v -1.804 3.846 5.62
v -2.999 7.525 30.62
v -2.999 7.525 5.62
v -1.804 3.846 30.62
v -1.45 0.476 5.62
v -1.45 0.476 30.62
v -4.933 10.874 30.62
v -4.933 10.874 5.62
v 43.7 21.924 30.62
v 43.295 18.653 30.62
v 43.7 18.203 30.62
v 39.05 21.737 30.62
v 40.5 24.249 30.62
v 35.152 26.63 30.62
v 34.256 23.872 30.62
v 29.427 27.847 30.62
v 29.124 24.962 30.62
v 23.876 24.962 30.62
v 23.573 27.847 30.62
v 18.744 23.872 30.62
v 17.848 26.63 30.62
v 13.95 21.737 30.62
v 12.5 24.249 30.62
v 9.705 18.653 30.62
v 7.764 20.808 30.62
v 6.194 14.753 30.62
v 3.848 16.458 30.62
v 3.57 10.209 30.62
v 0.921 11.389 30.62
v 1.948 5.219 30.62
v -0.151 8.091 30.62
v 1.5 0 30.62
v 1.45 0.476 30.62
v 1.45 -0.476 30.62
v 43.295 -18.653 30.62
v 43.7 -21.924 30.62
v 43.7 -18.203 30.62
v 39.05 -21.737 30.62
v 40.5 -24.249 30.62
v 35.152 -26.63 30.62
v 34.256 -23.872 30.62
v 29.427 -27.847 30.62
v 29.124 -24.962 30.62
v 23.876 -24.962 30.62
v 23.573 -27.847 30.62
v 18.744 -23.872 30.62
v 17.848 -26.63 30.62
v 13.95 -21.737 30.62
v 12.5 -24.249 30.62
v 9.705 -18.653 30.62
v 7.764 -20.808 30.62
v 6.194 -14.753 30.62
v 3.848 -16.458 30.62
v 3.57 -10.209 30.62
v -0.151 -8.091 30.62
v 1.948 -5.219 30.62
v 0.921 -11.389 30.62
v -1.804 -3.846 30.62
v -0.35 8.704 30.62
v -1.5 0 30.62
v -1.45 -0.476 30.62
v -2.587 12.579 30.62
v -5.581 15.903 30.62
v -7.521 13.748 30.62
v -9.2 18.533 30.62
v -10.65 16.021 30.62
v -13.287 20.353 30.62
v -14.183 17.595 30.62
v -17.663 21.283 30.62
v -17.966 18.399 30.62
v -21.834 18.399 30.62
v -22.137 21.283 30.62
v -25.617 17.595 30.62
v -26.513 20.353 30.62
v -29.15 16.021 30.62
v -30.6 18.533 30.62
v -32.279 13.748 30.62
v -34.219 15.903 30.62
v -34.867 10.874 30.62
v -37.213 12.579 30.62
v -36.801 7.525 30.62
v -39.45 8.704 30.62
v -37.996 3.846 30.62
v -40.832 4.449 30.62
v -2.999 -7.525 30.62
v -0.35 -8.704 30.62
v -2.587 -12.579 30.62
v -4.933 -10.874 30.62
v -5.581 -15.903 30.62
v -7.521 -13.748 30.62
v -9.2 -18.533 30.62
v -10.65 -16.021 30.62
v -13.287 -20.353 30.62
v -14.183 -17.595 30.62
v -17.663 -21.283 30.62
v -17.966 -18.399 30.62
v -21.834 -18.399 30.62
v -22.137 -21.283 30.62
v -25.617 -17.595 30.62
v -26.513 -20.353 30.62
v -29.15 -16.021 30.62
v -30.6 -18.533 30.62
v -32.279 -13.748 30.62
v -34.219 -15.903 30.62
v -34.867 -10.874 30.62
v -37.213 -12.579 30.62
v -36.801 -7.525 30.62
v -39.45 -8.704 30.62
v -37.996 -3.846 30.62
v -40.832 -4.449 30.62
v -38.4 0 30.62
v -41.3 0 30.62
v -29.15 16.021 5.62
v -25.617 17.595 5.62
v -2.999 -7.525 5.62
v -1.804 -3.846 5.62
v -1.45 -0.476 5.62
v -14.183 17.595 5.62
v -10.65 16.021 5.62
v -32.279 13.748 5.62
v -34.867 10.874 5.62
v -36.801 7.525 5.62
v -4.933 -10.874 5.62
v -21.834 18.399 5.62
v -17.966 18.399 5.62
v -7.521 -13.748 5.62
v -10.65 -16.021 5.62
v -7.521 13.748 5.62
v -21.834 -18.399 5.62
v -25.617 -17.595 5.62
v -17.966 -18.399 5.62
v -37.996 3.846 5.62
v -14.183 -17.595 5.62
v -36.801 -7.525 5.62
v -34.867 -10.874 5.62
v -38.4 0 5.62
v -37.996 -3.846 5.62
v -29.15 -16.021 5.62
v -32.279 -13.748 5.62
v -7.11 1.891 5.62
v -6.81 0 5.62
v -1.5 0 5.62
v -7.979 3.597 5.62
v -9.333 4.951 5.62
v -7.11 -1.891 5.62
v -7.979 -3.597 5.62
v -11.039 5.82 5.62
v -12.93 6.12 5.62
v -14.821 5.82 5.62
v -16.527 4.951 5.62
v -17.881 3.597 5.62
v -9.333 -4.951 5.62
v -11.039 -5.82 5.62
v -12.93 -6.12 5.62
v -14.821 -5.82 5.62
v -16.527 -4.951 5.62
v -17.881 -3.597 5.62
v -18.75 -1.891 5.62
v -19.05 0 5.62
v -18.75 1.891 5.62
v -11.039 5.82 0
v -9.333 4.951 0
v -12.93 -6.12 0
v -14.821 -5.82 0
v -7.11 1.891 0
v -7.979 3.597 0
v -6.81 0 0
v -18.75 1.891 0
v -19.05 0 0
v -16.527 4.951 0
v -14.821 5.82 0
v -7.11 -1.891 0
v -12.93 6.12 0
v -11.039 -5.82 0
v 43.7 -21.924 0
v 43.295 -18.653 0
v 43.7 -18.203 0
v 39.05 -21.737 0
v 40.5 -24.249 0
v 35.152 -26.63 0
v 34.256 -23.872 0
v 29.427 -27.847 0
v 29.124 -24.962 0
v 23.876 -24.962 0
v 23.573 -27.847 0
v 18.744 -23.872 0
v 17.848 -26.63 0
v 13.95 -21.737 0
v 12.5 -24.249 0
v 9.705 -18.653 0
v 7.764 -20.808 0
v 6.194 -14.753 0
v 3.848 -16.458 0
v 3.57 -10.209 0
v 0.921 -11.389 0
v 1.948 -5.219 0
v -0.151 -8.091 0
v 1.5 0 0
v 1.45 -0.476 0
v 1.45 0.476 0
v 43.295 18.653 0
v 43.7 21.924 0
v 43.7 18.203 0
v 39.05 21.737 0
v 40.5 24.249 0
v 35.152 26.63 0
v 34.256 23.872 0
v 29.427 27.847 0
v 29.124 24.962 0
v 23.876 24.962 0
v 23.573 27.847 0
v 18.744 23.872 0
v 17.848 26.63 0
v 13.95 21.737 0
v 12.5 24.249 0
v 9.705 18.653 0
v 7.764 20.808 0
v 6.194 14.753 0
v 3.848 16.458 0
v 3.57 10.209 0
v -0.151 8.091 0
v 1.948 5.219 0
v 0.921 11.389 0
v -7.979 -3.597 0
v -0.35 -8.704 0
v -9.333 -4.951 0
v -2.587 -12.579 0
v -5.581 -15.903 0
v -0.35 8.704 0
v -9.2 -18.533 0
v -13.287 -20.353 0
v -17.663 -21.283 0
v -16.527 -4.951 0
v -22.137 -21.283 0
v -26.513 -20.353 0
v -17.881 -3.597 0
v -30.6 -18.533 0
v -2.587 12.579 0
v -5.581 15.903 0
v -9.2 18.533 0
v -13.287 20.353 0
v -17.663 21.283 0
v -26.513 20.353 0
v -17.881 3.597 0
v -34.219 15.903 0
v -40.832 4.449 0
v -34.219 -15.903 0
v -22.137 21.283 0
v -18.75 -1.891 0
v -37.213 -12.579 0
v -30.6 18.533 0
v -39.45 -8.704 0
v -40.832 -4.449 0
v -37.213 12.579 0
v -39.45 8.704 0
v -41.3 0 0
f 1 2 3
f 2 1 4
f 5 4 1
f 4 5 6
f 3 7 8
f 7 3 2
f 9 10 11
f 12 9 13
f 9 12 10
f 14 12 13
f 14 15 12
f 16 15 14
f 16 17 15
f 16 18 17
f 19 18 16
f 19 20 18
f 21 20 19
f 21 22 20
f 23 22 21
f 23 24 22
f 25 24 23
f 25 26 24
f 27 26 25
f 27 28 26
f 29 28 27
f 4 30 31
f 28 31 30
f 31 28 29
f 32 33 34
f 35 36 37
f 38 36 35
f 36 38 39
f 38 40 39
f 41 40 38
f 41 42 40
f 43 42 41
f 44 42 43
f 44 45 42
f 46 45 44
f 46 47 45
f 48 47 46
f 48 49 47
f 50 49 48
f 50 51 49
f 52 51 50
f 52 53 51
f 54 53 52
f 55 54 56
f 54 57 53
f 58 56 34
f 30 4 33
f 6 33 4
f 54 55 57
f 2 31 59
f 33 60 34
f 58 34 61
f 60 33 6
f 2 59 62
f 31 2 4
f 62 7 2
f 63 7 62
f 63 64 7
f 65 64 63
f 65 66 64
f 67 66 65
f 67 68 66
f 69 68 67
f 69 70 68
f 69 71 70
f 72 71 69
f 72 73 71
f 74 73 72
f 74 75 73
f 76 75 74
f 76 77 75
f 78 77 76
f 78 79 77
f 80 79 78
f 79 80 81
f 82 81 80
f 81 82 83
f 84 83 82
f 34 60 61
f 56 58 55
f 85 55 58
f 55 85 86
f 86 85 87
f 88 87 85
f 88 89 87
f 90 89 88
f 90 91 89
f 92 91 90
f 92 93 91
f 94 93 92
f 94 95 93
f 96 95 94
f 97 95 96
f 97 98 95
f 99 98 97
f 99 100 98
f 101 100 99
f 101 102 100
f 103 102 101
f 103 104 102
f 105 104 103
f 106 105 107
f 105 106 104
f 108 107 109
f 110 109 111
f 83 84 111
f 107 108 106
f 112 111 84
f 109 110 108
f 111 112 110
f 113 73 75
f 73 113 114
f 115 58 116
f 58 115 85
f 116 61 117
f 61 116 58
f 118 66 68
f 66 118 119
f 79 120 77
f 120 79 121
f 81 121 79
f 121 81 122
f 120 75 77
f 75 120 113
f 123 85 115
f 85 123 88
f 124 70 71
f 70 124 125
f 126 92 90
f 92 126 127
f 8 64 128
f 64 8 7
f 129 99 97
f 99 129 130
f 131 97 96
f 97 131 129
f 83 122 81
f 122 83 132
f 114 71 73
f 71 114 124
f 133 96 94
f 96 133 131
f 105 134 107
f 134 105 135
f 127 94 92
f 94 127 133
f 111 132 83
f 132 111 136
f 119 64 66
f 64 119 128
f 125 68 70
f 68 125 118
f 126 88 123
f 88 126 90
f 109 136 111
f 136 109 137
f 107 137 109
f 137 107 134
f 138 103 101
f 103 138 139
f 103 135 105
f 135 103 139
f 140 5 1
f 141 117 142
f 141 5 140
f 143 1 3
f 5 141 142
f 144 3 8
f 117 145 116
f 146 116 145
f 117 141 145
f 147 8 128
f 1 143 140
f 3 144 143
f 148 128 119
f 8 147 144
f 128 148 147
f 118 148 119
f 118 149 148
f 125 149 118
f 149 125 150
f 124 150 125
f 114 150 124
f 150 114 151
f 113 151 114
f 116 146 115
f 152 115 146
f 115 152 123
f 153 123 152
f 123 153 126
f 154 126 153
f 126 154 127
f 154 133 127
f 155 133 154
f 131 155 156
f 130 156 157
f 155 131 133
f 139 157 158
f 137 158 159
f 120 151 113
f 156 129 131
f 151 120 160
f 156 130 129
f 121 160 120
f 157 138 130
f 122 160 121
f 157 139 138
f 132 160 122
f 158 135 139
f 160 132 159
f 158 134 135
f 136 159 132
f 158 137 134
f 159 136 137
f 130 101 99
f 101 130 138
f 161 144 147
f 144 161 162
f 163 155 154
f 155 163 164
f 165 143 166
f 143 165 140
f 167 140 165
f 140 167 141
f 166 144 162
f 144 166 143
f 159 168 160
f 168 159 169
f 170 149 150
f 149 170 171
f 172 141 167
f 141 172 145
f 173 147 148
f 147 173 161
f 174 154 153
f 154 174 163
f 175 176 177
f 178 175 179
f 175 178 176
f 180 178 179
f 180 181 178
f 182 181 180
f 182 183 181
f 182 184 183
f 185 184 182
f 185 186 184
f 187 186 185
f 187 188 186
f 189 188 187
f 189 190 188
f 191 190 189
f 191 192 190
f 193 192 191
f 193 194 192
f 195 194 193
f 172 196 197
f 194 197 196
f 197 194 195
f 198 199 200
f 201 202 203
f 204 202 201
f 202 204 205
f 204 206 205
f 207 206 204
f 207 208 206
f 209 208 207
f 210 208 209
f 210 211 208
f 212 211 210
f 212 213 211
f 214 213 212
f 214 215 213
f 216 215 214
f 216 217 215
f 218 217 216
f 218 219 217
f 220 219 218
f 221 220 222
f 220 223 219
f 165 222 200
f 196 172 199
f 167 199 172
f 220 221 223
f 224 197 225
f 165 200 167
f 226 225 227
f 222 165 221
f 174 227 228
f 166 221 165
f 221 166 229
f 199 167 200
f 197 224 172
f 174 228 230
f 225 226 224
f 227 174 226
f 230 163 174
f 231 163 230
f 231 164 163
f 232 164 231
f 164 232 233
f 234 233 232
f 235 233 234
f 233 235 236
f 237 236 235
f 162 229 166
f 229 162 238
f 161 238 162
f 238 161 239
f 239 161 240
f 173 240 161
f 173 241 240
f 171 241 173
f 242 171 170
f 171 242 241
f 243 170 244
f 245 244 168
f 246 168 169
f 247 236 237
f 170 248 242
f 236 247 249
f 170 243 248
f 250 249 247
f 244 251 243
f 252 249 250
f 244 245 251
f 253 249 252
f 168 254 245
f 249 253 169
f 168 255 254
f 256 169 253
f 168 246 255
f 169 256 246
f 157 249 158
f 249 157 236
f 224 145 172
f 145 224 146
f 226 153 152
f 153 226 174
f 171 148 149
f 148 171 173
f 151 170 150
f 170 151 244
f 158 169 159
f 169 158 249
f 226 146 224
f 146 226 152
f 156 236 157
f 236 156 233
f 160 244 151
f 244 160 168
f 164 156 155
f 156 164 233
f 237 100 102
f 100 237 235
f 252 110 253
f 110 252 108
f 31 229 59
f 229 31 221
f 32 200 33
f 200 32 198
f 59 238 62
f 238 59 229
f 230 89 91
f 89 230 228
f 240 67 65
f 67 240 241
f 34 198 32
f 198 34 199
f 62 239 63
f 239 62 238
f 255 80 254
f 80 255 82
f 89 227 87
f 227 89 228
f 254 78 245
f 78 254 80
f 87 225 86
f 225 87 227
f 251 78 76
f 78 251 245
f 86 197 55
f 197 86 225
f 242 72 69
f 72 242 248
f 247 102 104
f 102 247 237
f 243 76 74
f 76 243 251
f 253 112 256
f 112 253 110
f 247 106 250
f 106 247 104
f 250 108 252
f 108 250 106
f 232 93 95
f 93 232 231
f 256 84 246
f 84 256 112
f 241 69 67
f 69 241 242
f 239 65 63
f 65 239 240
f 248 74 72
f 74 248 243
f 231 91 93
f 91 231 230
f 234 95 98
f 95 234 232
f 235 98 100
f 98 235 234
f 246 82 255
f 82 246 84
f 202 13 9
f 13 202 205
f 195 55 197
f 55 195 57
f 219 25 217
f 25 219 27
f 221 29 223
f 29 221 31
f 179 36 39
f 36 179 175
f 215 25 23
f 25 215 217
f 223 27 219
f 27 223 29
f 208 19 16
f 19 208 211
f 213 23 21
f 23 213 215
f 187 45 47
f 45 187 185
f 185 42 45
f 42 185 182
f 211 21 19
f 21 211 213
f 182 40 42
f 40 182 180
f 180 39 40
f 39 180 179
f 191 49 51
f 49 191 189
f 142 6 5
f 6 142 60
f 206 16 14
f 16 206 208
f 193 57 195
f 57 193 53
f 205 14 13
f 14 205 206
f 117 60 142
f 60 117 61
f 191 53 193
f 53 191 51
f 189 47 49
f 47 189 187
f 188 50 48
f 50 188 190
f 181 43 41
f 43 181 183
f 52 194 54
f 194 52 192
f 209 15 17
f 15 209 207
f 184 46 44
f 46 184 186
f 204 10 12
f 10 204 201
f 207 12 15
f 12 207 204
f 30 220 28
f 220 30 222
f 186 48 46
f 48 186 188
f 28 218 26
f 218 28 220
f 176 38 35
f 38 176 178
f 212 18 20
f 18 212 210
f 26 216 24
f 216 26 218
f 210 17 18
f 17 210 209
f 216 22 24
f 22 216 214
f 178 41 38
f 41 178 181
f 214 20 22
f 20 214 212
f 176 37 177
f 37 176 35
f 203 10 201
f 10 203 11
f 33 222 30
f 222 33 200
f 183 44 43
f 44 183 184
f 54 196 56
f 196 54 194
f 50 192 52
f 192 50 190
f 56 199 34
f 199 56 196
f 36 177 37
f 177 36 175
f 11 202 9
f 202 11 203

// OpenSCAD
// Sorry for mixing openscad and freecad in one project.
// I started this project partly to learn freecad, but when I found
// myself needing to design the motor mount I didn't have the mental
// energy to re-inveigl myself into freecad, so I fell back on
// comfortable old openscad.


gearbox_r = 36.8/2; // The OD of the gearbox housing of the motor/gearbox combo I'm using.
gearbox_z = 25; // The length of the gearbox housing.
gearbox_out_r = 12.04/2; // A bearing enclosure that protrudes from the end of the gearbox.
gearbox_out_z = 5.62; // The length of the bearing holder protrusion
gearbox_out_edge_offset = 19.35; // The measured distance between the edge of the gearbox and the edge of the protrusion
gearbox_out_centre_offset = gearbox_out_edge_offset - (gearbox_r - gearbox_out_r); // Calculate the offset from the centre of the protrusion.
pump_r = 50/2; // The OD of the pump main housing, from the freecad file.
pump_z = gearbox_z+gearbox_out_z; // Limit the length of the mount to the size of the gearbox on the motor.
pump_slice_offset = 17.2; // From the freecad file, determines where the pump attachment ring is chopped off.

wt = 3; // Wall thickness.
clearance = 0.1;

module gearbox() {
    translate([0,0,gearbox_out_z]) cylinder(r=gearbox_r+clearance, h = gearbox_z);
    translate([gearbox_out_centre_offset,0,0]) cylinder(r=gearbox_out_r+clearance, h = gearbox_out_z);
}

module gearbox_shell() {
    difference() {
        cylinder(r=gearbox_r+wt, h = gearbox_z+gearbox_out_z);
        gearbox();
    }
}

module pump() {
    cylinder(r=pump_r+clearance, h = pump_z);
}

module pump_shell() {
    difference() {
        cylinder(r=pump_r+wt, h = pump_z);
        pump();
        translate([pump_slice_offset,-50,0]) cube([100,100,100]);
    }
}

module motor_mount() {
    translate([-gearbox_r-wt/2,0,0]) gearbox_shell();
    translate([pump_r+wt/2,0,0]) pump_shell();
}

motor_mount();
